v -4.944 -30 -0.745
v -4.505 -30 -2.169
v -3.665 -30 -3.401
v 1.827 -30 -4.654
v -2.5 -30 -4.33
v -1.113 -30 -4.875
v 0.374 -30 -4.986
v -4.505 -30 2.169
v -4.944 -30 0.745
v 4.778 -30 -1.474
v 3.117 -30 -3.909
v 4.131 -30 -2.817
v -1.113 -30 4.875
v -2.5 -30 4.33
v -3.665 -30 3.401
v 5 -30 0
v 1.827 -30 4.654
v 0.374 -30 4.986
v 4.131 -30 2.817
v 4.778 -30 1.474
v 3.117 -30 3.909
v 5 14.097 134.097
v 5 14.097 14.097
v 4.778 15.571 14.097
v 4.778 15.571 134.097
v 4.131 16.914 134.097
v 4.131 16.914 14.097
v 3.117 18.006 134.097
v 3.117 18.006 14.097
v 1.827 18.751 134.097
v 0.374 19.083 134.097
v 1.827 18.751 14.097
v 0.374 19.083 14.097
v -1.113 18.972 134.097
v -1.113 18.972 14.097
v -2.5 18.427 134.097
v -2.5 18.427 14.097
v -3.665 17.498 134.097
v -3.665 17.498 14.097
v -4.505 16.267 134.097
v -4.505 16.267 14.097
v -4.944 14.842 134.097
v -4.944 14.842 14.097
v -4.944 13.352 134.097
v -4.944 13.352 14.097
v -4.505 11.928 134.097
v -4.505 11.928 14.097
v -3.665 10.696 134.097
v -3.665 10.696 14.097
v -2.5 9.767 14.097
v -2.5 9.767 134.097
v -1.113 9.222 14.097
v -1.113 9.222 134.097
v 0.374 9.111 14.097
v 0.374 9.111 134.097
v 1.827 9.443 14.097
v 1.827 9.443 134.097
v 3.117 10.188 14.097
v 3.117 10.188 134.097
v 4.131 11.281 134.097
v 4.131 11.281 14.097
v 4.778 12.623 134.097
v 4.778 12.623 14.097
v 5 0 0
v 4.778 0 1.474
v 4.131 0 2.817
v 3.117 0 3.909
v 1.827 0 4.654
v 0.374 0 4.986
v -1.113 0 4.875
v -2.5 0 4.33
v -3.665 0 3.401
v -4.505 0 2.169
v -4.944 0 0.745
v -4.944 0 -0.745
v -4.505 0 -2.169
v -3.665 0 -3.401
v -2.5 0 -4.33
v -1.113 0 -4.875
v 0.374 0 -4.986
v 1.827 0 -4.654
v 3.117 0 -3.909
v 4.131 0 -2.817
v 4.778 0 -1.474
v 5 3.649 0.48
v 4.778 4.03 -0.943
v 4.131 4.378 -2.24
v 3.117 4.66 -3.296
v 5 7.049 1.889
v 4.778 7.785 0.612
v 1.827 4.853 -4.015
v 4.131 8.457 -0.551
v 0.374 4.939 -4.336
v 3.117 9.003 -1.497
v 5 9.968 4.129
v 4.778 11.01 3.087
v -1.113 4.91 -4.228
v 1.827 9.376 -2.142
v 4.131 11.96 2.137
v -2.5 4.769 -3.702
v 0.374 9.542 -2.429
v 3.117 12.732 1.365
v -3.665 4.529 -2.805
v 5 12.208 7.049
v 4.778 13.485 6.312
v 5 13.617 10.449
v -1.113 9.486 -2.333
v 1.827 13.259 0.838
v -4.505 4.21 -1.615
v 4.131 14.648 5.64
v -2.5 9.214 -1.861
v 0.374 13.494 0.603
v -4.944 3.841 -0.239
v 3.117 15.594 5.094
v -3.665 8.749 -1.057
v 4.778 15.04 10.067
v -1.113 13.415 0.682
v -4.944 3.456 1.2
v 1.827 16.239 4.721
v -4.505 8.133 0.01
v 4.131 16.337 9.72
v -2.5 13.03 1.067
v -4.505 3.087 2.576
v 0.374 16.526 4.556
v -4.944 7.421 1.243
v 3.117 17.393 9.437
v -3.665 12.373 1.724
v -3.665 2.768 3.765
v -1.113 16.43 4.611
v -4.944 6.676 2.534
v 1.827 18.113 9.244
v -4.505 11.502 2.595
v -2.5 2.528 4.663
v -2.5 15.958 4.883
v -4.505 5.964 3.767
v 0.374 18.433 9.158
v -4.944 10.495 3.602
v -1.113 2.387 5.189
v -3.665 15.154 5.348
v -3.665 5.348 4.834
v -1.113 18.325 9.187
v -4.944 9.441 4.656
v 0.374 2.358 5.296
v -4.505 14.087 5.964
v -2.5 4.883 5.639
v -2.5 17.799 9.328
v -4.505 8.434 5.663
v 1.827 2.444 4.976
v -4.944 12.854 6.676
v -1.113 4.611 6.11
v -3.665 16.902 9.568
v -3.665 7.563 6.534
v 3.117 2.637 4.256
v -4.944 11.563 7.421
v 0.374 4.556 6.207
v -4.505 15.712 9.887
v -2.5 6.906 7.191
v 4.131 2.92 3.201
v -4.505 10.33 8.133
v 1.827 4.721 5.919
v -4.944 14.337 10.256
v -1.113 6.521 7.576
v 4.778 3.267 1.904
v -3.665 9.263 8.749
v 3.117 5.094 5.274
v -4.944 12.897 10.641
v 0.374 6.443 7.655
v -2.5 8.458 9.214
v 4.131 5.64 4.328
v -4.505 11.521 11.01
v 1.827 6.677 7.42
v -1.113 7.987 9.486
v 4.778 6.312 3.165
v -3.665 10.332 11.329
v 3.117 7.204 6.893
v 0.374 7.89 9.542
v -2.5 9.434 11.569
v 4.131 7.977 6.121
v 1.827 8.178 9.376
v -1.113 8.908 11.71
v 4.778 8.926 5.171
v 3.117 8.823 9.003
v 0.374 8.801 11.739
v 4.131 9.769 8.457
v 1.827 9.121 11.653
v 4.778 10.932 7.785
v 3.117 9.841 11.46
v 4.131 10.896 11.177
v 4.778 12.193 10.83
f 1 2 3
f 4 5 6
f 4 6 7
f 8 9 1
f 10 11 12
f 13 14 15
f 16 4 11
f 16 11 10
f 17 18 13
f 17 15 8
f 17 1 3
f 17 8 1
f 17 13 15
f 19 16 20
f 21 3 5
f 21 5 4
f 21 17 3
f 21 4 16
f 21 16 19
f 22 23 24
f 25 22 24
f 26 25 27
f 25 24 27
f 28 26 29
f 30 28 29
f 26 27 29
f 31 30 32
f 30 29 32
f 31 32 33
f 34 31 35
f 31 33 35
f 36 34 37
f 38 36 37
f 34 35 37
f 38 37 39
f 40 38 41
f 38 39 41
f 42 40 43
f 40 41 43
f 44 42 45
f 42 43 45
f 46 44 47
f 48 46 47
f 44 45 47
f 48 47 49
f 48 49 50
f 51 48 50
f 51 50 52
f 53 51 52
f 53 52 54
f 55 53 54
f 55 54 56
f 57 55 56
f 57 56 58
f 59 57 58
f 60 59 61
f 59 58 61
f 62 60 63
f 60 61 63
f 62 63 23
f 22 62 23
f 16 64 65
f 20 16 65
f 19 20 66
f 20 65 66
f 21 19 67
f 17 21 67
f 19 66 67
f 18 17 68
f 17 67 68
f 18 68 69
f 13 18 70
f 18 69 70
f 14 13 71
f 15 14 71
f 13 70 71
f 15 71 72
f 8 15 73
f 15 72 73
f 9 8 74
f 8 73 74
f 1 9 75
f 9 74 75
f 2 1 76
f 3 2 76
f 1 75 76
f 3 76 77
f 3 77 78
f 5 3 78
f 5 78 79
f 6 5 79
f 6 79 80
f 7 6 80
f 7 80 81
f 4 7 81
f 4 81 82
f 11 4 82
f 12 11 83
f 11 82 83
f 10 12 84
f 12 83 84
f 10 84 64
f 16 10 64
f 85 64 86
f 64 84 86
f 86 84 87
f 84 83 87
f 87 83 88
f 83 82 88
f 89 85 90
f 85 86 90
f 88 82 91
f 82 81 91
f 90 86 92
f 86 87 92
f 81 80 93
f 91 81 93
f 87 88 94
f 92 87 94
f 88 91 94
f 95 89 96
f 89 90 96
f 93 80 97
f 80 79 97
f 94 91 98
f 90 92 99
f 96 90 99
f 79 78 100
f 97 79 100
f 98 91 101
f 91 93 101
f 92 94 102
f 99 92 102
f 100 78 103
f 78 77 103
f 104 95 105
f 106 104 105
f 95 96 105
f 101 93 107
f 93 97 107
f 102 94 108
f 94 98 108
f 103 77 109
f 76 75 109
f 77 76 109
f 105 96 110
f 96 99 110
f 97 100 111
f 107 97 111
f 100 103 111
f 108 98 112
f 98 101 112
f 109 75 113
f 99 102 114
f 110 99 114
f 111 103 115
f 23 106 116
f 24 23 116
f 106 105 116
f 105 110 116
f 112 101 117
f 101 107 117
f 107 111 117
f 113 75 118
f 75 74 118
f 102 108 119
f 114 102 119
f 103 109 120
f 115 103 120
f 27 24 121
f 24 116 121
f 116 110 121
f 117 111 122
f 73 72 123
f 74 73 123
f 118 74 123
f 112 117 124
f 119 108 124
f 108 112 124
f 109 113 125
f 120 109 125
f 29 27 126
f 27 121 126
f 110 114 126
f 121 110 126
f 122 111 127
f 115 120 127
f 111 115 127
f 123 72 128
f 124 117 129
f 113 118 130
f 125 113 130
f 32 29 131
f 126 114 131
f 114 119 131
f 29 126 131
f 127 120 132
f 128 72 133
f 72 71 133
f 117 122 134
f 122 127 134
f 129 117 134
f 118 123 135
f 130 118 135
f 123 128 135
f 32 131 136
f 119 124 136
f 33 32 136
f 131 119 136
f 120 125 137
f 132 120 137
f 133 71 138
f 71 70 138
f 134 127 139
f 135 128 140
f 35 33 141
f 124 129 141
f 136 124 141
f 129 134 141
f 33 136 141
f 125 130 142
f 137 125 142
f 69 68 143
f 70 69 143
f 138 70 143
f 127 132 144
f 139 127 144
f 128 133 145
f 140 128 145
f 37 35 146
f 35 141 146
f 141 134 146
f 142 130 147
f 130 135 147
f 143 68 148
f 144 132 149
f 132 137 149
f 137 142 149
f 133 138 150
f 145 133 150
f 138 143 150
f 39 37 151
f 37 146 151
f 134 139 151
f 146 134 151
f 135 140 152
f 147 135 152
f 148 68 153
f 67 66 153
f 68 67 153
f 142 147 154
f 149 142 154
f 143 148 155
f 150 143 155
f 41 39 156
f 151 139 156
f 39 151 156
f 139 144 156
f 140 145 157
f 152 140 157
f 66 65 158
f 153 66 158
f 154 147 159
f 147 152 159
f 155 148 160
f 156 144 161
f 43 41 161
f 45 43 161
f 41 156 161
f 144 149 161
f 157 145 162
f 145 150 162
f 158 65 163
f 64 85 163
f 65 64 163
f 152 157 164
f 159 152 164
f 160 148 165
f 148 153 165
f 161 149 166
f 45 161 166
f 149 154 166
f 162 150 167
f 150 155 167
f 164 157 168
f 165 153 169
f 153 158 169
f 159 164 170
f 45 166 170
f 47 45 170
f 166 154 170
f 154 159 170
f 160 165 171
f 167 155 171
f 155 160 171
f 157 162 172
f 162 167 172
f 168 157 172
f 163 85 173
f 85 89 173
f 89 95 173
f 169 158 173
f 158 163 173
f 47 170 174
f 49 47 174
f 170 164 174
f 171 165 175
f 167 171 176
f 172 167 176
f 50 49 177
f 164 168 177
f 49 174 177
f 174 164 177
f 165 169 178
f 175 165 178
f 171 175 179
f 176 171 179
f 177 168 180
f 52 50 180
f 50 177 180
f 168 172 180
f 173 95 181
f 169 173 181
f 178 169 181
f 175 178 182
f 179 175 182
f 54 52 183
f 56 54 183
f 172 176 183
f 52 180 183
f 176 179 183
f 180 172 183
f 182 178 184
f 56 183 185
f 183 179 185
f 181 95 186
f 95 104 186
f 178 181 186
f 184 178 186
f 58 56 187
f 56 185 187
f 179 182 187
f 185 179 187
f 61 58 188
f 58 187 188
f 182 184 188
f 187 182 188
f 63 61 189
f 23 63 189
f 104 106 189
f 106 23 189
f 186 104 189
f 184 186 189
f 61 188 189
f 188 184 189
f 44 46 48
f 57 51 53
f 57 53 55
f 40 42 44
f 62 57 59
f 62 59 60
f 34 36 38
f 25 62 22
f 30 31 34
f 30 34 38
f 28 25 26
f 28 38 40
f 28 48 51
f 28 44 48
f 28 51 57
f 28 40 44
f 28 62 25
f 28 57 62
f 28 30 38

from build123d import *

# Parameters (mm, degrees)
F0_R      = 5
F1_DEPTH  = 30
F1_FACE_R = 5
F3_ANGLE  = 90
F4_DEPTH  = 120


with BuildPart() as f1:
    # F0 (on Front) → F1 (new body)
    with BuildSketch(Plane.XZ):
        Circle(F0_R)
    extrude(amount=F1_DEPTH)

    # F1_face (on face) → F3 (revolve)
    with BuildSketch(Plane(origin=(0, 0, 0), x_dir=(1, 0, 0), z_dir=(0, 1, 0))):
        Circle(F1_FACE_R)
    revolve(axis=Axis((-10.6502734125, 0, 14.0971038491), (1, 0, 0)), revolution_arc=F3_ANGLE)

    # F4 (add): a face of the model
    f4_faces = [f1.faces().sort_by_distance(p)[0] for p in [
        (0, 14.0971038491, 14.0971038491),
    ]]
    extrude(f4_faces, amount=F4_DEPTH)


solid = f1.part
